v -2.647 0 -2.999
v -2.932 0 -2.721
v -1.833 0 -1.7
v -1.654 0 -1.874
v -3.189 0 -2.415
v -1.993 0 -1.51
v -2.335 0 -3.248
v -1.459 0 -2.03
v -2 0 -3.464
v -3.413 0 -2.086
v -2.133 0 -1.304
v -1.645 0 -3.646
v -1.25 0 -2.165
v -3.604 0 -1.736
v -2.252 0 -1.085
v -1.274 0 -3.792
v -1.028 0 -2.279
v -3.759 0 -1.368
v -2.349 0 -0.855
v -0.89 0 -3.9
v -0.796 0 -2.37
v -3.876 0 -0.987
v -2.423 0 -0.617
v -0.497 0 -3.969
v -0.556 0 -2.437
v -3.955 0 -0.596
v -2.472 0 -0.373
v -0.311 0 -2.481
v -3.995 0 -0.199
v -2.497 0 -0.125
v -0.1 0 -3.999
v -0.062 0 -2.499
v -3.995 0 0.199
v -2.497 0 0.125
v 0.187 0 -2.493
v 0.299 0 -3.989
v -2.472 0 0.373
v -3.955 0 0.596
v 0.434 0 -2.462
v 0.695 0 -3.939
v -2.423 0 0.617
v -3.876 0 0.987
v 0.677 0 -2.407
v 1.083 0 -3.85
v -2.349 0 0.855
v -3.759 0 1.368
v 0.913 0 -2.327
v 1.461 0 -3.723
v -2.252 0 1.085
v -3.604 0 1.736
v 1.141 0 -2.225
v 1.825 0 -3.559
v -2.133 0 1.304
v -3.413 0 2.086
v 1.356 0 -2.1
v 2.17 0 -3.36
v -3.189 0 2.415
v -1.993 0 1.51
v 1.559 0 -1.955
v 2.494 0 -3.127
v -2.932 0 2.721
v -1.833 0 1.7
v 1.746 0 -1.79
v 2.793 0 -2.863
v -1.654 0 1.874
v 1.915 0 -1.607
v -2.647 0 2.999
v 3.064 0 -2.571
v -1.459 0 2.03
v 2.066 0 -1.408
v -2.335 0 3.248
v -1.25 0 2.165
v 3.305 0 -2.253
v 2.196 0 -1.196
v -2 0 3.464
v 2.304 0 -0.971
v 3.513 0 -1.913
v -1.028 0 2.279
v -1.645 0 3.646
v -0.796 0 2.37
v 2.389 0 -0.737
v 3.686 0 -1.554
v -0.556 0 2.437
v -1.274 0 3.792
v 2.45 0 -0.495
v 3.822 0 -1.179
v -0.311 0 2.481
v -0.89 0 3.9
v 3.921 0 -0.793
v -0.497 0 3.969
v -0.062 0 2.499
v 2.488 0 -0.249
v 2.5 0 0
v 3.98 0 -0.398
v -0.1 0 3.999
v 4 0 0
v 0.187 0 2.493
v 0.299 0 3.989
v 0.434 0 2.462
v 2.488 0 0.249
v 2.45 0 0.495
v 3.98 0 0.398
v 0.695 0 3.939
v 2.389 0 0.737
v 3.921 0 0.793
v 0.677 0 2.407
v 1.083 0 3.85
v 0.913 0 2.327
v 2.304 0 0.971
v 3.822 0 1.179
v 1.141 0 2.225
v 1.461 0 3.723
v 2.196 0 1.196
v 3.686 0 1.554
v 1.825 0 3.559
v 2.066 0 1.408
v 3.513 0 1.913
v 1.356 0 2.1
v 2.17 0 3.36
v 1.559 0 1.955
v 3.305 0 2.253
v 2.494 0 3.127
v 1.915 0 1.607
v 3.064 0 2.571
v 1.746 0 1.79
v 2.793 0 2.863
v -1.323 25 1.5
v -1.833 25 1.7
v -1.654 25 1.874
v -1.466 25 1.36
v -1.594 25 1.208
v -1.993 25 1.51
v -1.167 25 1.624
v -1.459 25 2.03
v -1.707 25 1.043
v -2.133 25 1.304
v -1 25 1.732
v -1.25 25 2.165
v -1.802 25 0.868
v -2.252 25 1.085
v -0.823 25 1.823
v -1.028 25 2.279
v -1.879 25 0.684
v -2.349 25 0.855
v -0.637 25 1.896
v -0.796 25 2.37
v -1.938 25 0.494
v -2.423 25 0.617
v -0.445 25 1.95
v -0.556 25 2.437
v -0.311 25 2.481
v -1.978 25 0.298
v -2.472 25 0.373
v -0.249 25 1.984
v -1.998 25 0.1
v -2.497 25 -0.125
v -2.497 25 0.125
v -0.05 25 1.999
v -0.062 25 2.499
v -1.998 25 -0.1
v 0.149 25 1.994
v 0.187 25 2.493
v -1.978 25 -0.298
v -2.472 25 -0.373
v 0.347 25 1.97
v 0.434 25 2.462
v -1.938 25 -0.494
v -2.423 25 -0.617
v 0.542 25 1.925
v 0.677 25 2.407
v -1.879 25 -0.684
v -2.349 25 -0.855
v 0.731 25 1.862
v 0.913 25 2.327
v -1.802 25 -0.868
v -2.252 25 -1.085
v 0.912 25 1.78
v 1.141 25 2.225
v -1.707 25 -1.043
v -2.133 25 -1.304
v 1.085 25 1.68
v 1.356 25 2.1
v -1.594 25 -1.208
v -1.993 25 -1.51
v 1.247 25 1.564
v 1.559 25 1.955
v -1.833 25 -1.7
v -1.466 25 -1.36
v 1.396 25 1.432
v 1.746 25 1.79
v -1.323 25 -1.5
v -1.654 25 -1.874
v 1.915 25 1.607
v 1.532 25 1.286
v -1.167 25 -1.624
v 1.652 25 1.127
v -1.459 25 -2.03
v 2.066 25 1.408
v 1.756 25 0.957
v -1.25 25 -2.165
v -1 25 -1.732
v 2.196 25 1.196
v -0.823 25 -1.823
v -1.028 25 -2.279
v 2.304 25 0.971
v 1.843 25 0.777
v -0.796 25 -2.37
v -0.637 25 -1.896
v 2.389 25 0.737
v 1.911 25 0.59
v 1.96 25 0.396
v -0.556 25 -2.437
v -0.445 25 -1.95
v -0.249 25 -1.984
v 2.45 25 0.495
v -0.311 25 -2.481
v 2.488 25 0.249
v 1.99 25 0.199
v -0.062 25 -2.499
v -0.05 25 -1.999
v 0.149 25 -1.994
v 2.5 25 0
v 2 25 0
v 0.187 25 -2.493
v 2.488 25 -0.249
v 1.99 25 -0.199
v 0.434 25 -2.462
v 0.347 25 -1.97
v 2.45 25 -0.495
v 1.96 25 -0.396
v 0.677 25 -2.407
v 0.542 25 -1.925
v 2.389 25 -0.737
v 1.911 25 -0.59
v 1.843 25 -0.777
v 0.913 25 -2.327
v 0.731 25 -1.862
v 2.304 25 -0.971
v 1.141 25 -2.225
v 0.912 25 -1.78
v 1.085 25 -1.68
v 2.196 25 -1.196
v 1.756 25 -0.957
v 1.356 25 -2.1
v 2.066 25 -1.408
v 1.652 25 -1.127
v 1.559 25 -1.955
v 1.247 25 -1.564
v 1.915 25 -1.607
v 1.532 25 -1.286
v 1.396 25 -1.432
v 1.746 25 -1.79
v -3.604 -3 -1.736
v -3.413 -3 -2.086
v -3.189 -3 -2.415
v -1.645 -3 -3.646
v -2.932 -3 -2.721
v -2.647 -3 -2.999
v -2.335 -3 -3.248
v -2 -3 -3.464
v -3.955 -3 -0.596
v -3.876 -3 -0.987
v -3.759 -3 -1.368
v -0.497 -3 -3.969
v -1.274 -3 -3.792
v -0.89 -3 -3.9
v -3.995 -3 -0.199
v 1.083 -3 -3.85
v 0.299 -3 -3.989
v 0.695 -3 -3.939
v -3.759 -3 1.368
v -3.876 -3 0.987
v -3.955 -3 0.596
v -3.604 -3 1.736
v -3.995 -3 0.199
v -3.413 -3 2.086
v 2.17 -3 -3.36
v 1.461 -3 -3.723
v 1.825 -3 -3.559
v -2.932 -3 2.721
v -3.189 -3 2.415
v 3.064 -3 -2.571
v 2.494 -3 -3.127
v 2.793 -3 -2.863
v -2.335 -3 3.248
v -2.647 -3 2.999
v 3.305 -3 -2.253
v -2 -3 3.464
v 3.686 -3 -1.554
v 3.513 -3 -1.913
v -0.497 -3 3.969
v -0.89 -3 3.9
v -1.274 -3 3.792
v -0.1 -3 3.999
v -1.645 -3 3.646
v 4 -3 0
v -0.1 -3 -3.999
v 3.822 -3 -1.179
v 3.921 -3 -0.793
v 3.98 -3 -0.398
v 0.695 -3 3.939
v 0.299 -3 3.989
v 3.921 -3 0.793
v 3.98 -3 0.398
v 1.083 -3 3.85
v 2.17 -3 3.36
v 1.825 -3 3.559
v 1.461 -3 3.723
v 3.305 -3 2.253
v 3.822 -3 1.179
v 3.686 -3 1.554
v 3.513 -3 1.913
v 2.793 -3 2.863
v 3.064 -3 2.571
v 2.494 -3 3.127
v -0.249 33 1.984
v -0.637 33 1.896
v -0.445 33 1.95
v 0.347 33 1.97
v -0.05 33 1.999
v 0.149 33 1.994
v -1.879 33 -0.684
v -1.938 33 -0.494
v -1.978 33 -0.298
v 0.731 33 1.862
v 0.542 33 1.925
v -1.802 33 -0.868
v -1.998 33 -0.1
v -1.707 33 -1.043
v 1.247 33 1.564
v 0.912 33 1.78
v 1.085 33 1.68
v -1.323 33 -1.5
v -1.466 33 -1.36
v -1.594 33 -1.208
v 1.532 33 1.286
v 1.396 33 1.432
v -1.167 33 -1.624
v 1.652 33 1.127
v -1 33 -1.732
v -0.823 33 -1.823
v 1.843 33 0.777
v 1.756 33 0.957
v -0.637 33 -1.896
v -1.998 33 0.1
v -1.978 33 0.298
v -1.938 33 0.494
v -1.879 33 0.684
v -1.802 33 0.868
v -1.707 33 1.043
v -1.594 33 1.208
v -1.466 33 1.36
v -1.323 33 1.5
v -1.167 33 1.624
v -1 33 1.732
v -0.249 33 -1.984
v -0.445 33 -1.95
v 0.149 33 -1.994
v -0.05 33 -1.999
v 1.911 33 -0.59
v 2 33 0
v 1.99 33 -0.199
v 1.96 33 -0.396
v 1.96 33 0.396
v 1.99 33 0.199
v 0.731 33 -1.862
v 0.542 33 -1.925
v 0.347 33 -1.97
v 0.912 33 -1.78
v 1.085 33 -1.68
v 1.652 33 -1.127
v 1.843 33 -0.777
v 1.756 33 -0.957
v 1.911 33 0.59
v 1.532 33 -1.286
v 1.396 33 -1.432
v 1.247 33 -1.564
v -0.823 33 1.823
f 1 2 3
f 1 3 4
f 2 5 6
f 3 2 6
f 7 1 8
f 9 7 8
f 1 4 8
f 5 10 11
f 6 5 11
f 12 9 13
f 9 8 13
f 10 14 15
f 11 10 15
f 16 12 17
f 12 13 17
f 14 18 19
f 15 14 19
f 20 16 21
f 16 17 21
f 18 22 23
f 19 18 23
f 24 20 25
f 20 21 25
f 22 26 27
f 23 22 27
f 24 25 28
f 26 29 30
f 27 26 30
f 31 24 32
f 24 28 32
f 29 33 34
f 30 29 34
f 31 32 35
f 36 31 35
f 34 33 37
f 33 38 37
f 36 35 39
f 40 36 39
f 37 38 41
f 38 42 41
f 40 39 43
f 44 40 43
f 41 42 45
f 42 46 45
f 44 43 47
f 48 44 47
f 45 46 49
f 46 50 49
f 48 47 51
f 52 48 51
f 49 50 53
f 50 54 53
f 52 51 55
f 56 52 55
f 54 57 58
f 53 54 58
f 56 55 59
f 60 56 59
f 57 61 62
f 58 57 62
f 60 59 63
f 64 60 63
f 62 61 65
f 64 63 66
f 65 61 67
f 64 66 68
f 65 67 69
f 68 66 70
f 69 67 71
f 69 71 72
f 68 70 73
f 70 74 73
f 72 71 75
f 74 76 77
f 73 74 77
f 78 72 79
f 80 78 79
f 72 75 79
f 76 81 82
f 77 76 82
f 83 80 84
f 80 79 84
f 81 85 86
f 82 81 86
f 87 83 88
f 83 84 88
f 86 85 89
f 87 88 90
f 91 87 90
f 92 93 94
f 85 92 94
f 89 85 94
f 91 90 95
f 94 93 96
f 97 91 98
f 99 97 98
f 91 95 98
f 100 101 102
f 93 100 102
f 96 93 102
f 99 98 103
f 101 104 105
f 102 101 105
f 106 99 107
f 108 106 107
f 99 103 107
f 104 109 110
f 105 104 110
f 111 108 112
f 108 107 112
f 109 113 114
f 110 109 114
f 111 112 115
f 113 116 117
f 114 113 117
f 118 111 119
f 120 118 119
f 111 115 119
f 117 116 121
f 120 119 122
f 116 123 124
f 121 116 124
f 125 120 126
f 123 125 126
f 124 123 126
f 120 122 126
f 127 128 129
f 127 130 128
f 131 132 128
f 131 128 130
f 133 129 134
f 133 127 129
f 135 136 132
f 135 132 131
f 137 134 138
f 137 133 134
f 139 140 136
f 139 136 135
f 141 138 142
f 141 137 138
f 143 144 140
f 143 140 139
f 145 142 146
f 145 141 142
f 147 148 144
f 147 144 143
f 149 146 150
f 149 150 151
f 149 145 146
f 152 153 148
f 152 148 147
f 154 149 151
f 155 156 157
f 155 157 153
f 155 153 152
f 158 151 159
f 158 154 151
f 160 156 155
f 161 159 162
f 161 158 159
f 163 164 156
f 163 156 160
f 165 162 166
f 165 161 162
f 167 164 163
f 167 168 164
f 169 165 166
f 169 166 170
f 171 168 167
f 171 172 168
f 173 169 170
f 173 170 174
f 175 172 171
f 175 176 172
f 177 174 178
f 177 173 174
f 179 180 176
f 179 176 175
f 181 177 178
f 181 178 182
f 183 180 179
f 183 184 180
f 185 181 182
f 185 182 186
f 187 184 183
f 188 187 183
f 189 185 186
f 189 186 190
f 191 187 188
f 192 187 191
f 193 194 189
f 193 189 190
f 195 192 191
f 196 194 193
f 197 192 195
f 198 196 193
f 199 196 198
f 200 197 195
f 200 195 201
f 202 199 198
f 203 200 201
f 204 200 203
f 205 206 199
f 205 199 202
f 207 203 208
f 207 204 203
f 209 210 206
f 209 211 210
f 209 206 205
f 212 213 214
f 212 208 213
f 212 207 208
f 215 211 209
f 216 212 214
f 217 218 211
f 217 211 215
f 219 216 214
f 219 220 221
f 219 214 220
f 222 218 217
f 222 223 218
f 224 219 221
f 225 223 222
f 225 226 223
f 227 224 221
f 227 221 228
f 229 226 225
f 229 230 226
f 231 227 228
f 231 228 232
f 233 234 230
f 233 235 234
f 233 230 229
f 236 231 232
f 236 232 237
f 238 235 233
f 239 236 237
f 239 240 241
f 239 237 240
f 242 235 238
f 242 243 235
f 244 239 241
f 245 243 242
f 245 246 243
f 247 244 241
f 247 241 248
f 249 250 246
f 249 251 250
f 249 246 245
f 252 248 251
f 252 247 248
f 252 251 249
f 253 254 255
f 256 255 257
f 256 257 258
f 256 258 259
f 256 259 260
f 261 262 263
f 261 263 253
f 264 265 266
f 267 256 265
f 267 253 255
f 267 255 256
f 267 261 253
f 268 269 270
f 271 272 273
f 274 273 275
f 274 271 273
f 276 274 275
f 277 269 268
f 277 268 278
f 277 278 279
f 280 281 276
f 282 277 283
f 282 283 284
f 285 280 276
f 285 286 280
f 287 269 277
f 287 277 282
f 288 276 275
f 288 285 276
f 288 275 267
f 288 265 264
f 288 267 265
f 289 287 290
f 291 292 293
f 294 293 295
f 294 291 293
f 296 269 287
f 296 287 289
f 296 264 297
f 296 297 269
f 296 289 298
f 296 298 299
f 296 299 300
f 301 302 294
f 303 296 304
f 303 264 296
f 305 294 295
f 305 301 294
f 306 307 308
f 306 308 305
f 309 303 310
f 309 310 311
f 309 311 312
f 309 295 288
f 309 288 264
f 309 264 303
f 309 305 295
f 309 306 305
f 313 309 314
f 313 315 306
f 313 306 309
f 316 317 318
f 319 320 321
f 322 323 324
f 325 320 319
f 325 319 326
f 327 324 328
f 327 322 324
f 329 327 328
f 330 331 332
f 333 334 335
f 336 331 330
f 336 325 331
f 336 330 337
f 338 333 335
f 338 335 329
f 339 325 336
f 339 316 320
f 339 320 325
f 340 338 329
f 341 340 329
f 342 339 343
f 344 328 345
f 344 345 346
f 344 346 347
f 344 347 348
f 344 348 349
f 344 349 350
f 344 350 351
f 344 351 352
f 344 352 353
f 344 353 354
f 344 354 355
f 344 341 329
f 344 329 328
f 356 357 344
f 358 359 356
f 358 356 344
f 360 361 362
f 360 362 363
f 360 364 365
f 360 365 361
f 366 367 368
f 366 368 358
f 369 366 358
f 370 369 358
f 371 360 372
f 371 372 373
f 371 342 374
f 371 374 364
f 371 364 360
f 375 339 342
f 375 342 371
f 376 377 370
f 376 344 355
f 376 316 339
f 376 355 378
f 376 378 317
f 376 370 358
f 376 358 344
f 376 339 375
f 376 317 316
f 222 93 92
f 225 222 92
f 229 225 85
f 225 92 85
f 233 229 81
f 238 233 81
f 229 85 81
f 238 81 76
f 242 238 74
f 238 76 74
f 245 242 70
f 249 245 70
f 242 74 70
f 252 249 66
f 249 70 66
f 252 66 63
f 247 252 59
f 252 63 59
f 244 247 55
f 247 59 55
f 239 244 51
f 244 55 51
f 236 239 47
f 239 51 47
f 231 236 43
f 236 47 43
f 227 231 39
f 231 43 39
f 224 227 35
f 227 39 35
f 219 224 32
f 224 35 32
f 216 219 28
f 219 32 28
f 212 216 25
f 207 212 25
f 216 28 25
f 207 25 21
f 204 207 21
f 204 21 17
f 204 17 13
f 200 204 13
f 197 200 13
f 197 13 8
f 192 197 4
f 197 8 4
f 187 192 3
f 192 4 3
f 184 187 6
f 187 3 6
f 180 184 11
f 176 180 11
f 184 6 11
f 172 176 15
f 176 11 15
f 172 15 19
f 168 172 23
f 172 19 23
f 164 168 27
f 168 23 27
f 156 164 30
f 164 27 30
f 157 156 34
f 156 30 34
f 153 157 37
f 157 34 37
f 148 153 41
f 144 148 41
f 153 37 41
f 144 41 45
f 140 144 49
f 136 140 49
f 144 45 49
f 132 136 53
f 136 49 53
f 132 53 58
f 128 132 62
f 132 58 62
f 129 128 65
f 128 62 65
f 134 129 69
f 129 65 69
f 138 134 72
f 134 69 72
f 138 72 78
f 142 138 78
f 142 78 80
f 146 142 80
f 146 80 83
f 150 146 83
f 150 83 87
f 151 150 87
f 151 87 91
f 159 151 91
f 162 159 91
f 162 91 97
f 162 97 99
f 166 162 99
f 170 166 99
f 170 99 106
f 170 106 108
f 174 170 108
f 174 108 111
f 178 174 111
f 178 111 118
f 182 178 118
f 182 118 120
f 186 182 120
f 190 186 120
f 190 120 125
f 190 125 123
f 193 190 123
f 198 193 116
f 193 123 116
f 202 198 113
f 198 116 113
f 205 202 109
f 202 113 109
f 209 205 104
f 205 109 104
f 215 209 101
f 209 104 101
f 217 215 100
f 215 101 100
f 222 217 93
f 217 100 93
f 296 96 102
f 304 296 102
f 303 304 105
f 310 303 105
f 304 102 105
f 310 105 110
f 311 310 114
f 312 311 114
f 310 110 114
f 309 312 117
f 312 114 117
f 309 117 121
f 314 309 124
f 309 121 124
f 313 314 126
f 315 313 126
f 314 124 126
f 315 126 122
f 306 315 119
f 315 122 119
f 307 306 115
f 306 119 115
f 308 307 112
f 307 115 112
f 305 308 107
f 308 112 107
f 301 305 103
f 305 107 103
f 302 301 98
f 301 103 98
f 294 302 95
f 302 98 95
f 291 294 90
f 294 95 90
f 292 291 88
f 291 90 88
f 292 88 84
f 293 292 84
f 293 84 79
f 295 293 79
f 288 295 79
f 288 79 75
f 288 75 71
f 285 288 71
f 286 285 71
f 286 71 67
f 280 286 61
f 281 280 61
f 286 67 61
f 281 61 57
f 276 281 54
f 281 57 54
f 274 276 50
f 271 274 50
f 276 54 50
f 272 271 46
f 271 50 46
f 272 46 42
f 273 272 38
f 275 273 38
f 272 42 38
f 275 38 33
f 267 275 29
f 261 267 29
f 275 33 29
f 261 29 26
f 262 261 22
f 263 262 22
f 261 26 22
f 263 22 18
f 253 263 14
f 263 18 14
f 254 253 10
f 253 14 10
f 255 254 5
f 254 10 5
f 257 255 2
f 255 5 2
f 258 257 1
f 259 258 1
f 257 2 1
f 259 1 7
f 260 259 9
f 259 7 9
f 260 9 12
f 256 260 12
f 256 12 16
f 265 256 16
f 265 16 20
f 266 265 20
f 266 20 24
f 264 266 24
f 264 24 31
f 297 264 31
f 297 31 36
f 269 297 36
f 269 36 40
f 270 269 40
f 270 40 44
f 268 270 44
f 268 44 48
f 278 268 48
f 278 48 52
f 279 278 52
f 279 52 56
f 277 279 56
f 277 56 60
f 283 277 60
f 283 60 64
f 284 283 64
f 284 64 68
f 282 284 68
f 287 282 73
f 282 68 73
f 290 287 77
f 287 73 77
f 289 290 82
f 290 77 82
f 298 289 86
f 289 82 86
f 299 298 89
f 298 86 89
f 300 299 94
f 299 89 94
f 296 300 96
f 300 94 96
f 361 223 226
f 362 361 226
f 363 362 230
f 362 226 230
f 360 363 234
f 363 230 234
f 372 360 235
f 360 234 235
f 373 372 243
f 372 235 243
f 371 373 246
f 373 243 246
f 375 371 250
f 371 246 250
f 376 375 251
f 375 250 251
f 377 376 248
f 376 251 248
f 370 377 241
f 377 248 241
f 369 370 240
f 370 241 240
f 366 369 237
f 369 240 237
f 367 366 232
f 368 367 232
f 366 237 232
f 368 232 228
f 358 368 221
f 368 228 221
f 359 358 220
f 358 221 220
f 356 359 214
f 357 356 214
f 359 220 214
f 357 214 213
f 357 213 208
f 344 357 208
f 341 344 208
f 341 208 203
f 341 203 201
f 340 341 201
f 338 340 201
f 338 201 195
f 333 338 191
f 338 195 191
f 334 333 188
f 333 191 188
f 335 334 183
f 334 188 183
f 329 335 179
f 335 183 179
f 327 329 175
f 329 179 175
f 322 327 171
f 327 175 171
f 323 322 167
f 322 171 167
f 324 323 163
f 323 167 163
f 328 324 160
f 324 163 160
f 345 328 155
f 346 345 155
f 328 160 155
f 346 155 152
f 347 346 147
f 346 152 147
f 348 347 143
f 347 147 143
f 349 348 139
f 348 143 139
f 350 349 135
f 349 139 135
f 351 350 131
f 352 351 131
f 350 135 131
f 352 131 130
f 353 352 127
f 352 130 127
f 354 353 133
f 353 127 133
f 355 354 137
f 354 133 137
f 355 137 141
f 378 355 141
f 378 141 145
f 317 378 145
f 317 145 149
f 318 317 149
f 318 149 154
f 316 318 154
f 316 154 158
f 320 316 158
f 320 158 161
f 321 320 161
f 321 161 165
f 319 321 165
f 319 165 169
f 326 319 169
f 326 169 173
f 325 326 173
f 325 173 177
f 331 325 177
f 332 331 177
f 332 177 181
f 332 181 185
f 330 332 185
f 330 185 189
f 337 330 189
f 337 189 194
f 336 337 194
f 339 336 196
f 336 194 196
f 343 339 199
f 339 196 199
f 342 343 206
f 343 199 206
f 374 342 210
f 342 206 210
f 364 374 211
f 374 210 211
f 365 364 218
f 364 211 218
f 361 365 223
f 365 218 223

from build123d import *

# Parameters (mm, degrees)
SKETCH_1_R      = 2.5
EXTRUDE_1_DEPTH = 25
SKETCH_2_R      = 2
EXTRUDE_2_DEPTH = 8
SKETCH_3_R      = 4
EXTRUDE_3_DEPTH = 3


with BuildPart() as part:
    # 草图1 → 凸台-拉伸1 (new body)
    with BuildSketch(Plane(origin=(0, 0, 0), x_dir=(1, 0, 0), z_dir=(0, 1, 0))):
        Circle(SKETCH_1_R)
    extrude(amount=EXTRUDE_1_DEPTH)

    # 草图2 → 凸台-拉伸2 (add)
    with BuildSketch(Plane(origin=(0, 25, 0), x_dir=(1, 0, 0), z_dir=(0, 1, 0))):
        Circle(SKETCH_2_R)
    extrude(amount=EXTRUDE_2_DEPTH)

    # 草图3 → 凸台-拉伸3 (add)
    with BuildSketch(Plane.XZ):
        Circle(SKETCH_3_R)
    extrude(amount=EXTRUDE_3_DEPTH)


solid = part.part
